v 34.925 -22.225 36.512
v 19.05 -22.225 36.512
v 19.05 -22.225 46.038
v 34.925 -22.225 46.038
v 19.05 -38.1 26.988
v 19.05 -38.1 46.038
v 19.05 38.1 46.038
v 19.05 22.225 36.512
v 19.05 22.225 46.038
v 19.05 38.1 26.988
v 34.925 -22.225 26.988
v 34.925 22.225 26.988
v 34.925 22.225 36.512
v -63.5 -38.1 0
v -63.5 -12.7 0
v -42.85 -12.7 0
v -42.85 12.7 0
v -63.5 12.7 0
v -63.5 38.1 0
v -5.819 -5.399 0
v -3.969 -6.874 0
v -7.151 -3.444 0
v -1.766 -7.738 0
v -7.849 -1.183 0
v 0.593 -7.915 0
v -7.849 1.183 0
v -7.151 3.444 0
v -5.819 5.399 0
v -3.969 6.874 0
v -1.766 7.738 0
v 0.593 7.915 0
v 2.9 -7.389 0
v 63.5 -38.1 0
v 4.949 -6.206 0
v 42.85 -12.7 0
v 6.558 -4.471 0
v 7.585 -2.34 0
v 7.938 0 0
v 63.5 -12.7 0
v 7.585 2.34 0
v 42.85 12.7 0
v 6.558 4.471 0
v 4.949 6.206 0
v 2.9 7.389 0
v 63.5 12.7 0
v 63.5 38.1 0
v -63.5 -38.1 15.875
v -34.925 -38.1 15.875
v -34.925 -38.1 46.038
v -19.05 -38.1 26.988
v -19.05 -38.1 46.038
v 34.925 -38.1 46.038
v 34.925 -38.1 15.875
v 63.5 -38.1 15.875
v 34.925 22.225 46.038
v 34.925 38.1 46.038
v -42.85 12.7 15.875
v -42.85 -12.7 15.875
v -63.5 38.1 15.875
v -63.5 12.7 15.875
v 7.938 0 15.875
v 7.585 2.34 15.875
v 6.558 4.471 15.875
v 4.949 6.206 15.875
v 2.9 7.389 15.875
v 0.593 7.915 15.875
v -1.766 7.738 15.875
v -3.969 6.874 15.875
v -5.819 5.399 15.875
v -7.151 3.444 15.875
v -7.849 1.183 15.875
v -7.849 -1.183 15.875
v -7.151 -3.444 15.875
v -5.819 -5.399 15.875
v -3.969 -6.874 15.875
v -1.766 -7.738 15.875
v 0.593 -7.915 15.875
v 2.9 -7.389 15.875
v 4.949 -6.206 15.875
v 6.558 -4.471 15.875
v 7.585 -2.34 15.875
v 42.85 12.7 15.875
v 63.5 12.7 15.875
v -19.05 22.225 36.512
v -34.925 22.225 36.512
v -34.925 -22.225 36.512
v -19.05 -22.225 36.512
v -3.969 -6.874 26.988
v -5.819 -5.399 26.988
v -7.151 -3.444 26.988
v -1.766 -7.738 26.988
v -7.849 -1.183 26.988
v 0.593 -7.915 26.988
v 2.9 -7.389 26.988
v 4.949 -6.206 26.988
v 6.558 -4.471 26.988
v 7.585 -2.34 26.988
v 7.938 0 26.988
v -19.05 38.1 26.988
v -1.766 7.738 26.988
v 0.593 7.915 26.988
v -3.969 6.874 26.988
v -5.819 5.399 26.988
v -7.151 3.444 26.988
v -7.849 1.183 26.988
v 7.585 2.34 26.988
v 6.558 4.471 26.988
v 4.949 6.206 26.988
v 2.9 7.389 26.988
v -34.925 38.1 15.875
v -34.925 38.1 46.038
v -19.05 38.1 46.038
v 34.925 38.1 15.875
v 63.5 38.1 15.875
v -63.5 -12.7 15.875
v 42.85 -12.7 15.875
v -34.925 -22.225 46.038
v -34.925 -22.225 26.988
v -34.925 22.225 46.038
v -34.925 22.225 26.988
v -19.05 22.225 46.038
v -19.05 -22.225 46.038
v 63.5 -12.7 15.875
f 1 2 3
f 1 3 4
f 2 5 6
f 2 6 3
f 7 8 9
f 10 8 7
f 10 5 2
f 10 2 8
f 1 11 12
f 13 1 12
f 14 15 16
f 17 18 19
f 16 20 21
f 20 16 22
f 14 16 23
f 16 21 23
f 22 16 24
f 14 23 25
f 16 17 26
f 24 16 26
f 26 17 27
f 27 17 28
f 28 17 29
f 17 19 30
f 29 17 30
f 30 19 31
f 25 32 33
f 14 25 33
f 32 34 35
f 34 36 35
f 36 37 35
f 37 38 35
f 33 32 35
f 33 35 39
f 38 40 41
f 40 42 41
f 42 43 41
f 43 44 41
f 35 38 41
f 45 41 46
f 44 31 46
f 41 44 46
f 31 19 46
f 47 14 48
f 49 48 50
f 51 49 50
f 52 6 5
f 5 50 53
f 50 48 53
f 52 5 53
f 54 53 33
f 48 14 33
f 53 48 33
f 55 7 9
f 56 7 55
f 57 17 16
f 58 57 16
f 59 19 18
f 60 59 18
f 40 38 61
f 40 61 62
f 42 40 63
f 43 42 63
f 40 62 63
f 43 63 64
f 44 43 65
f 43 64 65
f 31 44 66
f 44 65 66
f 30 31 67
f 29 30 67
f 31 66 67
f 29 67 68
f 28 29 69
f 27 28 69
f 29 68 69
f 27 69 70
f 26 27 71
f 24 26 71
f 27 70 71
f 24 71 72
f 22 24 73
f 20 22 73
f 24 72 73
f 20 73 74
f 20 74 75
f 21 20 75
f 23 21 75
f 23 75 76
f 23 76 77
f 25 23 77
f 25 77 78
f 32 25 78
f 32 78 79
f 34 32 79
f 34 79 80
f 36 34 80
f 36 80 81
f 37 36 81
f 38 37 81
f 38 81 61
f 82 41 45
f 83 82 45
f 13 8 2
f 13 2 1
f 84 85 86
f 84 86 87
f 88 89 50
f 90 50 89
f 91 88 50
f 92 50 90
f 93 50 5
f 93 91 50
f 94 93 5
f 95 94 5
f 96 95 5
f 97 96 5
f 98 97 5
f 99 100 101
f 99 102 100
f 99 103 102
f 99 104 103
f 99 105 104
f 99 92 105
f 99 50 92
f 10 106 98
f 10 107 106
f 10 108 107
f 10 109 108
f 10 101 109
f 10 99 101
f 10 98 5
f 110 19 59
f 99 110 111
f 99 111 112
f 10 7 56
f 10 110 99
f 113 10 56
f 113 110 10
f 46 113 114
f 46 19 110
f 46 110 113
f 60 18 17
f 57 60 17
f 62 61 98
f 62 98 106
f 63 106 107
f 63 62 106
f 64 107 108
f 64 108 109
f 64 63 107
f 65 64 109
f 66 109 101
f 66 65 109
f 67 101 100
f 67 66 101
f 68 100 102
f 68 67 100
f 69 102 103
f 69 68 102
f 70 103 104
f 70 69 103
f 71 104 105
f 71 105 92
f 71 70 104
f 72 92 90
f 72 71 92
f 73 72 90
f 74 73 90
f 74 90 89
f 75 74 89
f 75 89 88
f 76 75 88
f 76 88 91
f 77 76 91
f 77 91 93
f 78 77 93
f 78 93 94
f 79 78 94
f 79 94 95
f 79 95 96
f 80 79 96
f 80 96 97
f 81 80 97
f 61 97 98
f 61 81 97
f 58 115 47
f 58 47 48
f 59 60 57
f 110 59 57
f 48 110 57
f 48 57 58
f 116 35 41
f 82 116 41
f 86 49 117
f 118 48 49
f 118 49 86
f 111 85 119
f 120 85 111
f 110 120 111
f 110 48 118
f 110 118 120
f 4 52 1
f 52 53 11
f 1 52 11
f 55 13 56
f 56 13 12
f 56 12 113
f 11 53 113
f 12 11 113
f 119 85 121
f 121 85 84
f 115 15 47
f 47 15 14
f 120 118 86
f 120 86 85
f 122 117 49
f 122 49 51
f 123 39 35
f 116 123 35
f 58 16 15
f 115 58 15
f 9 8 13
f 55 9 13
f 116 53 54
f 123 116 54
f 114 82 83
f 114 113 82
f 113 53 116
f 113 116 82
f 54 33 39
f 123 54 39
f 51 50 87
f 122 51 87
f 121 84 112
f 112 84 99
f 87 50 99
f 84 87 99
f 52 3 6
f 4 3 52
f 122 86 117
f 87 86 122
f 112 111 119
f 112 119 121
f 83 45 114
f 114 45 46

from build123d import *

# Parameters (mm, degrees)
F1_DEPTH = 15.875
F2_W     = 69.85
F2_H     = 76.2
F2_R     = 7.9375
F3_DEPTH = 11.1125
F4_DEPTH = 15.876
F5_W     = 15.875
F5_H     = 15.875
F6_DEPTH = 19.05
F7_W     = 15.875
F7_H     = 44.45
F8_DEPTH = 9.525


# Not quite as in the source:
# - a length typed as a fraction of an inch, garbled in the dataset ("3 / 203.2 mm" for 3/8 in), is restored


with BuildPart() as f1:
    # F0 (on Top) → F1 (new body)
    with BuildSketch(Plane.XY):
        Polygon((63.5, 12.7), (63.5, 38.1), (-63.5, 38.1), (-63.5, 12.7), (-42.8498, 12.7), (-42.8498, -12.7), (-63.5, -12.7), (-63.5, -38.1), (63.5, -38.1), (63.5, -12.7), (42.8498, -12.7), (42.8498, 12.7), align=None)
    extrude(amount=F1_DEPTH)

    # F2 (on face) → F3 (join)
    with BuildSketch(Plane.XY.offset(15.875)):
        Rectangle(F2_W, F2_H)
        Circle(F2_R, mode=Mode.SUBTRACT)
    extrude(amount=F3_DEPTH)

    # F4 (cut, through all): a face of the model
    f4_faces = [f1.faces().sort_by_distance(p)[0] for p in [
        (0, 0, 15.875),
    ]]
    extrude(f4_faces, amount=-F4_DEPTH, mode=Mode.SUBTRACT)

    # F5 (on face) → F6 (join)
    with BuildSketch(Plane.XY.offset(26.9875)):
        with Locations((-26.9875, 30.1625)):
            Rectangle(F5_W, F5_H)
        with Locations((26.9875, 30.1625)):
            Rectangle(F5_W, F5_H)
        with Locations((26.9875, -30.1625)):
            Rectangle(F5_W, F5_H)
        with Locations((-26.9875, -30.1625)):
            Rectangle(F5_W, F5_H)
    extrude(amount=F6_DEPTH)

    # F7 (on face) → F8 (join)
    with BuildSketch(Plane.XY.offset(26.9875)):
        with Locations((26.9875, 0)):
            Rectangle(F7_W, F7_H)
        with Locations((-26.9875, 0)):
            Rectangle(F7_W, F7_H)
    extrude(amount=F8_DEPTH)


solid = f1.part
